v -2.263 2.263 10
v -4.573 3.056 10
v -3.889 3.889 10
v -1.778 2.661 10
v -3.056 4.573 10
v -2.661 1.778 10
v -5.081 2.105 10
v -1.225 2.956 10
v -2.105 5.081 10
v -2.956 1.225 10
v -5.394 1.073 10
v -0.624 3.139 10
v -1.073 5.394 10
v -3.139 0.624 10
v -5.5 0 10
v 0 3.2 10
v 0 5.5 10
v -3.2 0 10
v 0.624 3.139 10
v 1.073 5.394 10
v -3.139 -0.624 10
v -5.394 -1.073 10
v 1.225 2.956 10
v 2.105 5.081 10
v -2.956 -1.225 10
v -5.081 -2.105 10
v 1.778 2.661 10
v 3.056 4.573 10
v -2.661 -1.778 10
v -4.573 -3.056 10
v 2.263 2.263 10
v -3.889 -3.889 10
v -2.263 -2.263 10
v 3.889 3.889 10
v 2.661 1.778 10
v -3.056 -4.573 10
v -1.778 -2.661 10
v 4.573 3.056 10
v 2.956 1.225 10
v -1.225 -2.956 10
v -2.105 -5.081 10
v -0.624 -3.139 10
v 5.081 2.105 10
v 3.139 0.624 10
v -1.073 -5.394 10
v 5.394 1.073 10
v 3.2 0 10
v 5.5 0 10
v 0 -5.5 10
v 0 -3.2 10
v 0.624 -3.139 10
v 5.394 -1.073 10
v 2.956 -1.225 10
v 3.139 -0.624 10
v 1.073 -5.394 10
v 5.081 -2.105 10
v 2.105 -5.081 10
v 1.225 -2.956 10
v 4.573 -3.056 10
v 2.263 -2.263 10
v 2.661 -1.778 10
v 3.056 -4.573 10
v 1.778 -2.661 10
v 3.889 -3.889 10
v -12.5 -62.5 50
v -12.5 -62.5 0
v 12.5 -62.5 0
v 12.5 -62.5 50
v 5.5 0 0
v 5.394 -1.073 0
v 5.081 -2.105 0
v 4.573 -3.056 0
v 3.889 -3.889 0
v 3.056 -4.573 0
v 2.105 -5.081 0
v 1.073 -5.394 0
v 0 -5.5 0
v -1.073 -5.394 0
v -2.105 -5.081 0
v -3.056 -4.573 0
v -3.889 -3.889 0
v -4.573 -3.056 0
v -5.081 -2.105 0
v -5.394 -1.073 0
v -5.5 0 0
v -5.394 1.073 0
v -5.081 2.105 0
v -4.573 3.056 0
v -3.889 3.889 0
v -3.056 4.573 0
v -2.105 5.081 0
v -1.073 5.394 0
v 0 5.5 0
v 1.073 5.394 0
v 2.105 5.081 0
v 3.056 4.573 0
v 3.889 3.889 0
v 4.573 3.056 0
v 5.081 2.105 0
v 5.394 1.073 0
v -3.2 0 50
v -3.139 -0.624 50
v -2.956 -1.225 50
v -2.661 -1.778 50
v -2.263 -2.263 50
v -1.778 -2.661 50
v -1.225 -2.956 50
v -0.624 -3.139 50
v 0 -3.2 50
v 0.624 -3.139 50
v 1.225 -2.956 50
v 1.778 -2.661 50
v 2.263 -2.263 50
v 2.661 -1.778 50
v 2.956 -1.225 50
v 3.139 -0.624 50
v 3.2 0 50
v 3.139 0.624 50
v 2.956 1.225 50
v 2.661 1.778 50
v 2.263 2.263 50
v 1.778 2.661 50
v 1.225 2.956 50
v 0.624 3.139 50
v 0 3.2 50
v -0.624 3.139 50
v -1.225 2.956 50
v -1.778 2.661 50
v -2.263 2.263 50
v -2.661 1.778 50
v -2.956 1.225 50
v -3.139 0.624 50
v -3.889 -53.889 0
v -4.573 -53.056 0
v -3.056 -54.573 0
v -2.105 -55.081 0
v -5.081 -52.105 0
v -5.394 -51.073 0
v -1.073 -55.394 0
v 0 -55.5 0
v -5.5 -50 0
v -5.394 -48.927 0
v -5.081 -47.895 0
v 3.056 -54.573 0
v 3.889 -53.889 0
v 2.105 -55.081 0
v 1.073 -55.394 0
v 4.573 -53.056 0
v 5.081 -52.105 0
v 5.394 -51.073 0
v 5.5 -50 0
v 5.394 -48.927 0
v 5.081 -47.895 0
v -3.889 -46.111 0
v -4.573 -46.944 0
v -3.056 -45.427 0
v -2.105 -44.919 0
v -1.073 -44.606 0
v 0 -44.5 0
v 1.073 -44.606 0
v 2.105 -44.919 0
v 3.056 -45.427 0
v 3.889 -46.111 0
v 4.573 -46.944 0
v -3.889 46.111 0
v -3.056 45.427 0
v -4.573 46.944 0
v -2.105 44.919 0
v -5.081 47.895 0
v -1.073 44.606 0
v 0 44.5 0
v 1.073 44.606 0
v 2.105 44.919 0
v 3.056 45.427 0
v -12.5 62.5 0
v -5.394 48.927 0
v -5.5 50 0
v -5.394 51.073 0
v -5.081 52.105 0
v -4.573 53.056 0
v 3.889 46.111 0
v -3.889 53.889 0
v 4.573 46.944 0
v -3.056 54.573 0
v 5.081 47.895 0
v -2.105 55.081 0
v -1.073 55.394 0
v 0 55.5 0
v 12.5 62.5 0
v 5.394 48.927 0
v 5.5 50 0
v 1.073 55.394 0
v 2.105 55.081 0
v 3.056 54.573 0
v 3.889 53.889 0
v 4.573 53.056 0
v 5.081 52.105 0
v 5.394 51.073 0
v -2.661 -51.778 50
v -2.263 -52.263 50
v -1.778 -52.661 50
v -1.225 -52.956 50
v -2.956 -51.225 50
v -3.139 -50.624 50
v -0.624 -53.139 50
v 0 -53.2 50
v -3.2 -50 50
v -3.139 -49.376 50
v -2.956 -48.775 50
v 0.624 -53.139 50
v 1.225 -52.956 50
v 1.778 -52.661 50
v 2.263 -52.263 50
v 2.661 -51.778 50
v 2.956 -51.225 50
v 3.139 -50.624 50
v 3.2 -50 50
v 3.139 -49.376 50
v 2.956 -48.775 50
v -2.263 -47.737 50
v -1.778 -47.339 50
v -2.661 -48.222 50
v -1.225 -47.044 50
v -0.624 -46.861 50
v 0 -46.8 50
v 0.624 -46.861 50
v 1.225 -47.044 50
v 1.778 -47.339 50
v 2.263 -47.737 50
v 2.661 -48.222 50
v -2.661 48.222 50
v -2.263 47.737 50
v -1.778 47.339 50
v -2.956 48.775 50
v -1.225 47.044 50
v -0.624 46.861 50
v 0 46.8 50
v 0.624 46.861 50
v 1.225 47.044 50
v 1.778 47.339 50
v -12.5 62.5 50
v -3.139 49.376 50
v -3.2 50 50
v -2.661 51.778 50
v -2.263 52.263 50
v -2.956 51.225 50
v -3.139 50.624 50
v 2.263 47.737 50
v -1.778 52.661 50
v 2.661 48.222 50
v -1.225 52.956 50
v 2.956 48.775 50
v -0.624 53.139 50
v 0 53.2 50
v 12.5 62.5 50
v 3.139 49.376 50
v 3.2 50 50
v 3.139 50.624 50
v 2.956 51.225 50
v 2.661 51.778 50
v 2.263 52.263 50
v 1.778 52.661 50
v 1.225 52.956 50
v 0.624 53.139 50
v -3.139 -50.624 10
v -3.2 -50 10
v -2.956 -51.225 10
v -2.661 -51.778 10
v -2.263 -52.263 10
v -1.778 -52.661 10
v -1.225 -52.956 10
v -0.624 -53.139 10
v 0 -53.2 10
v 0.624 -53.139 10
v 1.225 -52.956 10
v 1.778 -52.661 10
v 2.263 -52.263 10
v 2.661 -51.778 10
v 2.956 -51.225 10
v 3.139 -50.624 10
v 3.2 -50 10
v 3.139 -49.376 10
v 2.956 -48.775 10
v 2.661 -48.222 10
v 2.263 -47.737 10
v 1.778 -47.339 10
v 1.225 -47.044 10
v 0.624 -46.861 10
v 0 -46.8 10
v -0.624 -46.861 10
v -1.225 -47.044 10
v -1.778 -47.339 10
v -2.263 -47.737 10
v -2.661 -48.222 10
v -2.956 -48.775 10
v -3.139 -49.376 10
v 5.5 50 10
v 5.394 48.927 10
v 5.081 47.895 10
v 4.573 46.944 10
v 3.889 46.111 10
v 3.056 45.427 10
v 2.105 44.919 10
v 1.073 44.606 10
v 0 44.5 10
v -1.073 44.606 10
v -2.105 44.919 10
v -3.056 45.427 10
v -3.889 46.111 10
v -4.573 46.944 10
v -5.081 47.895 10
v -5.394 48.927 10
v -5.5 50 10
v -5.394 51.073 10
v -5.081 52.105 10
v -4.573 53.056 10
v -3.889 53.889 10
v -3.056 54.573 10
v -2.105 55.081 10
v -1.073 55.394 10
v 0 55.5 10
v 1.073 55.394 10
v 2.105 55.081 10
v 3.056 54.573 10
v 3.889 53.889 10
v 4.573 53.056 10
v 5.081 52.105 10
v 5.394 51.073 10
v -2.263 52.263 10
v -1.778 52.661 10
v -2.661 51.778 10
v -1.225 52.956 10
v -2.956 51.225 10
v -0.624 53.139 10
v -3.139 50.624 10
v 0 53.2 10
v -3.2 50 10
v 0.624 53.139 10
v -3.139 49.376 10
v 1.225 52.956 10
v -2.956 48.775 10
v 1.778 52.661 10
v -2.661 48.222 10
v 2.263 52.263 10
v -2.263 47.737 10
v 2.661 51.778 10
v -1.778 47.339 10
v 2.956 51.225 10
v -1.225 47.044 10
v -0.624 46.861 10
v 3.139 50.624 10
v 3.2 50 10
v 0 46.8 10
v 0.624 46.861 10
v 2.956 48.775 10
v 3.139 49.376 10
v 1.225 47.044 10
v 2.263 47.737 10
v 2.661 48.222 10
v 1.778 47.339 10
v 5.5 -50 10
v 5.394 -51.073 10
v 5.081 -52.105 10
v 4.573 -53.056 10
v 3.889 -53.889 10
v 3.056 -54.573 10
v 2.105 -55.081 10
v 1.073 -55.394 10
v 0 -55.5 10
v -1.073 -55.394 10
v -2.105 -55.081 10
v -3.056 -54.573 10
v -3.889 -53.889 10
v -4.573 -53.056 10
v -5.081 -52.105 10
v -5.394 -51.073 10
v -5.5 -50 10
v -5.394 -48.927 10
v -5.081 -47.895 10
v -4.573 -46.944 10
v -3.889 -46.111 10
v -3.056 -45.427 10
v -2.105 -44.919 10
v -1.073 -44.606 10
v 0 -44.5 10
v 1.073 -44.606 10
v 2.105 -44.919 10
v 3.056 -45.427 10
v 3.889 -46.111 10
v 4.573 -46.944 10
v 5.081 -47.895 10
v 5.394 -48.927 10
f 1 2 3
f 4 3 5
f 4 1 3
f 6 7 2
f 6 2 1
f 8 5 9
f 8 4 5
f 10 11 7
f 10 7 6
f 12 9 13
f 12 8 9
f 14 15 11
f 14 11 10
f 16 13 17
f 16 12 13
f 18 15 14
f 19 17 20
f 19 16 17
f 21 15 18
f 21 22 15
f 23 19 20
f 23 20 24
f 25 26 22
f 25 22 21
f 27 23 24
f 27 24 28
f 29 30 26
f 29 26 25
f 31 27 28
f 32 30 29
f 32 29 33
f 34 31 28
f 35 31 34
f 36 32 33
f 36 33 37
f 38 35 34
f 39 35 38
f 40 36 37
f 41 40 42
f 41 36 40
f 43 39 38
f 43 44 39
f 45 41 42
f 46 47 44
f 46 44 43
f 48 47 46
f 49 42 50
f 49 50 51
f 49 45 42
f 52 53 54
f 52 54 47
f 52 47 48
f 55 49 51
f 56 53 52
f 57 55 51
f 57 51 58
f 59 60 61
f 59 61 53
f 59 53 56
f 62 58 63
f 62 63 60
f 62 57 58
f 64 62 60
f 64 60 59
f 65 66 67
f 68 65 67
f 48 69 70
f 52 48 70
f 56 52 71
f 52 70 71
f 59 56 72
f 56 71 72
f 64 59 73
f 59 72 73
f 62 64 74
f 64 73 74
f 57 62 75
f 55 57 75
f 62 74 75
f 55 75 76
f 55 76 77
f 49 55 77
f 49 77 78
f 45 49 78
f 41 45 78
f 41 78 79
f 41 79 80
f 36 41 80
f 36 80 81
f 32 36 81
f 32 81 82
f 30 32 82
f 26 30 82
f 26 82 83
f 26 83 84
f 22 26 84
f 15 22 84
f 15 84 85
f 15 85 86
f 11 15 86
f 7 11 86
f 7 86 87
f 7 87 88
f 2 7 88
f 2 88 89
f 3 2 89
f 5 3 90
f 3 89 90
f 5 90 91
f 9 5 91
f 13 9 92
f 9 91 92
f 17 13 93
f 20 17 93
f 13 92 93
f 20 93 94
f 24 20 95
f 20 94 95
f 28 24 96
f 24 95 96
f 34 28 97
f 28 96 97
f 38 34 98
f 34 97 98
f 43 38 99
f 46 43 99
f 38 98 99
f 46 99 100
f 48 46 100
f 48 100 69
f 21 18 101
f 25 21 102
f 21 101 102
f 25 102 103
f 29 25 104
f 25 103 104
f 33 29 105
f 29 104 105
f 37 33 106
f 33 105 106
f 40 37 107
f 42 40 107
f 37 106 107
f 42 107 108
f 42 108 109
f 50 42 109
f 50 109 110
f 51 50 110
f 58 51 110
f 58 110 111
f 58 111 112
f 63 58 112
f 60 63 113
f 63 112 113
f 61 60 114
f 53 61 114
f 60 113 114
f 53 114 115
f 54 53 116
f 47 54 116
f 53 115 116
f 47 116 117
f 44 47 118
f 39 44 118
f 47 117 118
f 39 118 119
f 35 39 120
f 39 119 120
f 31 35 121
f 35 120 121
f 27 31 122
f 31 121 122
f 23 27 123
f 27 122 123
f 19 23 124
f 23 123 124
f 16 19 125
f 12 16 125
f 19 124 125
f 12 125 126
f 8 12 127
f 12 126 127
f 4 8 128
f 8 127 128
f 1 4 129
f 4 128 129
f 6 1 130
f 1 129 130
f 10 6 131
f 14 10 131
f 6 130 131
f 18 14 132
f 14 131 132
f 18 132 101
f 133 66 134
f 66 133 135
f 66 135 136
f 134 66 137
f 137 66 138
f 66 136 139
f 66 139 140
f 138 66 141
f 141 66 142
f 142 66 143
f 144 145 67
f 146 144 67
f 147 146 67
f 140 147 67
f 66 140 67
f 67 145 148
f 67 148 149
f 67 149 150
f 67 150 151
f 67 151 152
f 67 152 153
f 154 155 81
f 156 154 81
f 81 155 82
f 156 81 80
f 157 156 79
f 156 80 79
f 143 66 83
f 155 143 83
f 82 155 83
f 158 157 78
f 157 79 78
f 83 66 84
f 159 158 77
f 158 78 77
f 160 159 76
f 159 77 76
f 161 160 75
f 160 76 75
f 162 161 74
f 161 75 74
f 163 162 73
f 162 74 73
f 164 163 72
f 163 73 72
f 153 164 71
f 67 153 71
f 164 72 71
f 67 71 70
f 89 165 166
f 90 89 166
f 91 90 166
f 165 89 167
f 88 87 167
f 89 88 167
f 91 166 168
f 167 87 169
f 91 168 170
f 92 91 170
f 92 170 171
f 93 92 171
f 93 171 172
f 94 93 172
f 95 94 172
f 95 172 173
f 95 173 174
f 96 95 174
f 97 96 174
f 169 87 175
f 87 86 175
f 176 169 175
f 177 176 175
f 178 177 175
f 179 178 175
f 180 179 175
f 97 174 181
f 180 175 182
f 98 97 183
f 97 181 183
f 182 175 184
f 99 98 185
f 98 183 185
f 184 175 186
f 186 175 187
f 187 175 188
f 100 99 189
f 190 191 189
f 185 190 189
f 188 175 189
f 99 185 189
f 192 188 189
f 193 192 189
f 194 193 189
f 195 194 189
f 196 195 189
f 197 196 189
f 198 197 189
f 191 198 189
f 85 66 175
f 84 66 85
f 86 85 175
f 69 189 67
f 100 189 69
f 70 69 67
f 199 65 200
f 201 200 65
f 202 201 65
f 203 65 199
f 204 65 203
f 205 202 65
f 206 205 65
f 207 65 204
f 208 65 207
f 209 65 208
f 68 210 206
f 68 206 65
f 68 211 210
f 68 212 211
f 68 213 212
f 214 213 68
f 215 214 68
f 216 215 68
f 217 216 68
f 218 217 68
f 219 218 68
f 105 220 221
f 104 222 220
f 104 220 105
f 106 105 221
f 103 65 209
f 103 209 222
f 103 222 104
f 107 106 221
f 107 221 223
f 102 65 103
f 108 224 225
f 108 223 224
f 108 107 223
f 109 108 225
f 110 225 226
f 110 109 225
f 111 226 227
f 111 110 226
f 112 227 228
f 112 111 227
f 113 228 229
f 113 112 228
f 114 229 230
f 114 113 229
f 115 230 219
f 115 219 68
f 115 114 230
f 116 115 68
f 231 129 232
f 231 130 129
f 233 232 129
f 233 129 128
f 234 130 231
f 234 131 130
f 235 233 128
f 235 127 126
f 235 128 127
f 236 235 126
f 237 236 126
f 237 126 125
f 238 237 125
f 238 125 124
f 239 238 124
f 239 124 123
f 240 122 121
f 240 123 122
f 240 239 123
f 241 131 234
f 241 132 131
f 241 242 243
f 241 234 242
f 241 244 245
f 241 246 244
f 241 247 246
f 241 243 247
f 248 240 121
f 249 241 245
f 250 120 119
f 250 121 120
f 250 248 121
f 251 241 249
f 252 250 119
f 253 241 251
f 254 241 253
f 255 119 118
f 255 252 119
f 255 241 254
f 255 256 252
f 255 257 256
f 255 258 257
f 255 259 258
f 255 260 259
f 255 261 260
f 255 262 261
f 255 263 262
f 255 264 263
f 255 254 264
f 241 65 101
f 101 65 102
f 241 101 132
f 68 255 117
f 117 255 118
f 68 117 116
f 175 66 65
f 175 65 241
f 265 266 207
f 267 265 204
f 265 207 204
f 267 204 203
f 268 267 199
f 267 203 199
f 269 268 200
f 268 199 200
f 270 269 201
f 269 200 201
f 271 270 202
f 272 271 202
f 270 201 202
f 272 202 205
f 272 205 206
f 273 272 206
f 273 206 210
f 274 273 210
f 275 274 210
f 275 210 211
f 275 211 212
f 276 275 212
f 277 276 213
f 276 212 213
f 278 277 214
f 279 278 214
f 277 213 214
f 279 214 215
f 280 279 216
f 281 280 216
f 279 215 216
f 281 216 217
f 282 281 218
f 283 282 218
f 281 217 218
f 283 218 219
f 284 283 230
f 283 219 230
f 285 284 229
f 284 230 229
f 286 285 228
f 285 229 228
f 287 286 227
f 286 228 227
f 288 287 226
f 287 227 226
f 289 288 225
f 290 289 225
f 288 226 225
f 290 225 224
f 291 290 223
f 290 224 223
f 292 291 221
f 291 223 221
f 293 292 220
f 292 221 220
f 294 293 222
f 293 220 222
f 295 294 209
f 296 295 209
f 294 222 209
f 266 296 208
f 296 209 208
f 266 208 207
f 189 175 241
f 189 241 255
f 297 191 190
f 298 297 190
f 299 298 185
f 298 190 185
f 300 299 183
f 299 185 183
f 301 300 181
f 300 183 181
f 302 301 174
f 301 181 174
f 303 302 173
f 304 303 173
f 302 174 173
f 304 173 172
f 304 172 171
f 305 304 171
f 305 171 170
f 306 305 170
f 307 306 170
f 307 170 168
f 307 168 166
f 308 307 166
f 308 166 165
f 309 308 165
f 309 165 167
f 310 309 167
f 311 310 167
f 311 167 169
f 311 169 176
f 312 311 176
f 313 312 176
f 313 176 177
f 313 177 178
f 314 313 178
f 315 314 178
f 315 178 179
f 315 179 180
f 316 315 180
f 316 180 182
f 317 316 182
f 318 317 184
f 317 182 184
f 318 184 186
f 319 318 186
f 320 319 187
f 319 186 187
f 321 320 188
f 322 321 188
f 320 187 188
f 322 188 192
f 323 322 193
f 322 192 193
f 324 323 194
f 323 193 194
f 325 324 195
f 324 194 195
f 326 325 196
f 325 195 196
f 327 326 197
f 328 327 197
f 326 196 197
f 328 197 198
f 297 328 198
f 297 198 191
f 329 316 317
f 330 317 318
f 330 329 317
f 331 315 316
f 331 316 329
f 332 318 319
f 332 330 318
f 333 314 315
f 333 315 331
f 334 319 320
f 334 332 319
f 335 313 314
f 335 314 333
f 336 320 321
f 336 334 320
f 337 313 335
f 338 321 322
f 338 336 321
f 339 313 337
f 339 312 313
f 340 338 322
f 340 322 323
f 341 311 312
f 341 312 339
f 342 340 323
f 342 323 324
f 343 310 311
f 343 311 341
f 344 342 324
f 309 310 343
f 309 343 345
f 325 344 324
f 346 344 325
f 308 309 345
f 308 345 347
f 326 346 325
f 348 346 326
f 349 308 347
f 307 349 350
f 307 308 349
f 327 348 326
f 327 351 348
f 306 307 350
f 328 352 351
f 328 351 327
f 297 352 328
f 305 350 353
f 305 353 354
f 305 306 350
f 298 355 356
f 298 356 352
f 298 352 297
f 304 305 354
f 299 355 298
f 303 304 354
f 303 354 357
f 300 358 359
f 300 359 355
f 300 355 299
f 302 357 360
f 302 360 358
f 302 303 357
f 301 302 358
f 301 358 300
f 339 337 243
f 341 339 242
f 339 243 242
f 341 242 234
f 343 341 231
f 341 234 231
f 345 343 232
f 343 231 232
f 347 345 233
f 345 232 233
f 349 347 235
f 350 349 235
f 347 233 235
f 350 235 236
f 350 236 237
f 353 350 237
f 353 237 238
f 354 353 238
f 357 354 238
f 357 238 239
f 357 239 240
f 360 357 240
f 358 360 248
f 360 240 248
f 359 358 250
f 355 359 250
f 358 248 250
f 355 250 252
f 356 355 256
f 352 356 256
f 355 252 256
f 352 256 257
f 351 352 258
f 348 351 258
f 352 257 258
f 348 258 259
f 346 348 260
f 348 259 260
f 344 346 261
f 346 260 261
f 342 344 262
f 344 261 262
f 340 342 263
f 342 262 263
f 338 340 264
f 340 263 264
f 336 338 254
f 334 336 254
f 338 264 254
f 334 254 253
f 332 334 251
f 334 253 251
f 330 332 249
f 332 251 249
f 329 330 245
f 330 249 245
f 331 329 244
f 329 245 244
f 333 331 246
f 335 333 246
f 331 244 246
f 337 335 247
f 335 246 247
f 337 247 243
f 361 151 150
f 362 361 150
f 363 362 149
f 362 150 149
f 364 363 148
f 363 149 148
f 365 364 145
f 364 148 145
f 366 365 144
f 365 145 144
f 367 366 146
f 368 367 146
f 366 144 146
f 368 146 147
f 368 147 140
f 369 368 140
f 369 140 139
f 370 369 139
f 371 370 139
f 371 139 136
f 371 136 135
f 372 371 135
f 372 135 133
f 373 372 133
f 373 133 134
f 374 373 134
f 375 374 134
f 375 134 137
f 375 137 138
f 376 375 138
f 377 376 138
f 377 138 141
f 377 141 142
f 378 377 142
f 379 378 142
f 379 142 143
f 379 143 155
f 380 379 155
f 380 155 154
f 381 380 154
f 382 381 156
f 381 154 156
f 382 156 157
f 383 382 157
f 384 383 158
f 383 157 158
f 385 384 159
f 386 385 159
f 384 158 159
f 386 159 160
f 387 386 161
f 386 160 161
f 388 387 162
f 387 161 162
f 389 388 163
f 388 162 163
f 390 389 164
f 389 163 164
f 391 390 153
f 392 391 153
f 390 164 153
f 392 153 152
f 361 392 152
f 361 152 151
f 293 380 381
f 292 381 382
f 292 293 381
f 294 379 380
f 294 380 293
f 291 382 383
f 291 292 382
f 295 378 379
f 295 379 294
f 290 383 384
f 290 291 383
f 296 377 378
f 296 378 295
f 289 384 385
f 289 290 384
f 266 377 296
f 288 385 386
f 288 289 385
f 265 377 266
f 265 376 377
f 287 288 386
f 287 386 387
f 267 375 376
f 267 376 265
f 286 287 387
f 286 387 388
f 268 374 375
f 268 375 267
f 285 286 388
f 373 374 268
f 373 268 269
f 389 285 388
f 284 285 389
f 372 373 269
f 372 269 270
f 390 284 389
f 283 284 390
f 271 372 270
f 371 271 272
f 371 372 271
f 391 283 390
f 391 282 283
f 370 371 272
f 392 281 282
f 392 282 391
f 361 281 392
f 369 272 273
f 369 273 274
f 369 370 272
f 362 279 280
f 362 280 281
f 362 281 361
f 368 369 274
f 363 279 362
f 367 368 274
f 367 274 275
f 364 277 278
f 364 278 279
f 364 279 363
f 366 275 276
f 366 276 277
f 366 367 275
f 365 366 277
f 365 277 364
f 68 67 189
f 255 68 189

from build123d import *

# Parameters (mm, degrees)
F0_W           = 25
F0_H           = 125
F1_DEPTH       = 50
F3_D           = 6.4
F3_CBORE_D     = 11
F3_CBORE_DEPTH = 10


with BuildPart() as f1:
    # F0 (on Top) → F1 (new body)
    with BuildSketch(Plane.XY):
        Rectangle(F0_W, F0_H)
    extrude(amount=F1_DEPTH)

    # F3 (through all)
    with Locations(Plane(origin=(0, 0, 0), x_dir=(1, 0, 0), z_dir=(0, 0, -1))):
        with Locations((0, 50), (0, -50), (0, 0)):
            CounterBoreHole(F3_D / 2, F3_CBORE_D / 2, F3_CBORE_DEPTH)


solid = f1.part
